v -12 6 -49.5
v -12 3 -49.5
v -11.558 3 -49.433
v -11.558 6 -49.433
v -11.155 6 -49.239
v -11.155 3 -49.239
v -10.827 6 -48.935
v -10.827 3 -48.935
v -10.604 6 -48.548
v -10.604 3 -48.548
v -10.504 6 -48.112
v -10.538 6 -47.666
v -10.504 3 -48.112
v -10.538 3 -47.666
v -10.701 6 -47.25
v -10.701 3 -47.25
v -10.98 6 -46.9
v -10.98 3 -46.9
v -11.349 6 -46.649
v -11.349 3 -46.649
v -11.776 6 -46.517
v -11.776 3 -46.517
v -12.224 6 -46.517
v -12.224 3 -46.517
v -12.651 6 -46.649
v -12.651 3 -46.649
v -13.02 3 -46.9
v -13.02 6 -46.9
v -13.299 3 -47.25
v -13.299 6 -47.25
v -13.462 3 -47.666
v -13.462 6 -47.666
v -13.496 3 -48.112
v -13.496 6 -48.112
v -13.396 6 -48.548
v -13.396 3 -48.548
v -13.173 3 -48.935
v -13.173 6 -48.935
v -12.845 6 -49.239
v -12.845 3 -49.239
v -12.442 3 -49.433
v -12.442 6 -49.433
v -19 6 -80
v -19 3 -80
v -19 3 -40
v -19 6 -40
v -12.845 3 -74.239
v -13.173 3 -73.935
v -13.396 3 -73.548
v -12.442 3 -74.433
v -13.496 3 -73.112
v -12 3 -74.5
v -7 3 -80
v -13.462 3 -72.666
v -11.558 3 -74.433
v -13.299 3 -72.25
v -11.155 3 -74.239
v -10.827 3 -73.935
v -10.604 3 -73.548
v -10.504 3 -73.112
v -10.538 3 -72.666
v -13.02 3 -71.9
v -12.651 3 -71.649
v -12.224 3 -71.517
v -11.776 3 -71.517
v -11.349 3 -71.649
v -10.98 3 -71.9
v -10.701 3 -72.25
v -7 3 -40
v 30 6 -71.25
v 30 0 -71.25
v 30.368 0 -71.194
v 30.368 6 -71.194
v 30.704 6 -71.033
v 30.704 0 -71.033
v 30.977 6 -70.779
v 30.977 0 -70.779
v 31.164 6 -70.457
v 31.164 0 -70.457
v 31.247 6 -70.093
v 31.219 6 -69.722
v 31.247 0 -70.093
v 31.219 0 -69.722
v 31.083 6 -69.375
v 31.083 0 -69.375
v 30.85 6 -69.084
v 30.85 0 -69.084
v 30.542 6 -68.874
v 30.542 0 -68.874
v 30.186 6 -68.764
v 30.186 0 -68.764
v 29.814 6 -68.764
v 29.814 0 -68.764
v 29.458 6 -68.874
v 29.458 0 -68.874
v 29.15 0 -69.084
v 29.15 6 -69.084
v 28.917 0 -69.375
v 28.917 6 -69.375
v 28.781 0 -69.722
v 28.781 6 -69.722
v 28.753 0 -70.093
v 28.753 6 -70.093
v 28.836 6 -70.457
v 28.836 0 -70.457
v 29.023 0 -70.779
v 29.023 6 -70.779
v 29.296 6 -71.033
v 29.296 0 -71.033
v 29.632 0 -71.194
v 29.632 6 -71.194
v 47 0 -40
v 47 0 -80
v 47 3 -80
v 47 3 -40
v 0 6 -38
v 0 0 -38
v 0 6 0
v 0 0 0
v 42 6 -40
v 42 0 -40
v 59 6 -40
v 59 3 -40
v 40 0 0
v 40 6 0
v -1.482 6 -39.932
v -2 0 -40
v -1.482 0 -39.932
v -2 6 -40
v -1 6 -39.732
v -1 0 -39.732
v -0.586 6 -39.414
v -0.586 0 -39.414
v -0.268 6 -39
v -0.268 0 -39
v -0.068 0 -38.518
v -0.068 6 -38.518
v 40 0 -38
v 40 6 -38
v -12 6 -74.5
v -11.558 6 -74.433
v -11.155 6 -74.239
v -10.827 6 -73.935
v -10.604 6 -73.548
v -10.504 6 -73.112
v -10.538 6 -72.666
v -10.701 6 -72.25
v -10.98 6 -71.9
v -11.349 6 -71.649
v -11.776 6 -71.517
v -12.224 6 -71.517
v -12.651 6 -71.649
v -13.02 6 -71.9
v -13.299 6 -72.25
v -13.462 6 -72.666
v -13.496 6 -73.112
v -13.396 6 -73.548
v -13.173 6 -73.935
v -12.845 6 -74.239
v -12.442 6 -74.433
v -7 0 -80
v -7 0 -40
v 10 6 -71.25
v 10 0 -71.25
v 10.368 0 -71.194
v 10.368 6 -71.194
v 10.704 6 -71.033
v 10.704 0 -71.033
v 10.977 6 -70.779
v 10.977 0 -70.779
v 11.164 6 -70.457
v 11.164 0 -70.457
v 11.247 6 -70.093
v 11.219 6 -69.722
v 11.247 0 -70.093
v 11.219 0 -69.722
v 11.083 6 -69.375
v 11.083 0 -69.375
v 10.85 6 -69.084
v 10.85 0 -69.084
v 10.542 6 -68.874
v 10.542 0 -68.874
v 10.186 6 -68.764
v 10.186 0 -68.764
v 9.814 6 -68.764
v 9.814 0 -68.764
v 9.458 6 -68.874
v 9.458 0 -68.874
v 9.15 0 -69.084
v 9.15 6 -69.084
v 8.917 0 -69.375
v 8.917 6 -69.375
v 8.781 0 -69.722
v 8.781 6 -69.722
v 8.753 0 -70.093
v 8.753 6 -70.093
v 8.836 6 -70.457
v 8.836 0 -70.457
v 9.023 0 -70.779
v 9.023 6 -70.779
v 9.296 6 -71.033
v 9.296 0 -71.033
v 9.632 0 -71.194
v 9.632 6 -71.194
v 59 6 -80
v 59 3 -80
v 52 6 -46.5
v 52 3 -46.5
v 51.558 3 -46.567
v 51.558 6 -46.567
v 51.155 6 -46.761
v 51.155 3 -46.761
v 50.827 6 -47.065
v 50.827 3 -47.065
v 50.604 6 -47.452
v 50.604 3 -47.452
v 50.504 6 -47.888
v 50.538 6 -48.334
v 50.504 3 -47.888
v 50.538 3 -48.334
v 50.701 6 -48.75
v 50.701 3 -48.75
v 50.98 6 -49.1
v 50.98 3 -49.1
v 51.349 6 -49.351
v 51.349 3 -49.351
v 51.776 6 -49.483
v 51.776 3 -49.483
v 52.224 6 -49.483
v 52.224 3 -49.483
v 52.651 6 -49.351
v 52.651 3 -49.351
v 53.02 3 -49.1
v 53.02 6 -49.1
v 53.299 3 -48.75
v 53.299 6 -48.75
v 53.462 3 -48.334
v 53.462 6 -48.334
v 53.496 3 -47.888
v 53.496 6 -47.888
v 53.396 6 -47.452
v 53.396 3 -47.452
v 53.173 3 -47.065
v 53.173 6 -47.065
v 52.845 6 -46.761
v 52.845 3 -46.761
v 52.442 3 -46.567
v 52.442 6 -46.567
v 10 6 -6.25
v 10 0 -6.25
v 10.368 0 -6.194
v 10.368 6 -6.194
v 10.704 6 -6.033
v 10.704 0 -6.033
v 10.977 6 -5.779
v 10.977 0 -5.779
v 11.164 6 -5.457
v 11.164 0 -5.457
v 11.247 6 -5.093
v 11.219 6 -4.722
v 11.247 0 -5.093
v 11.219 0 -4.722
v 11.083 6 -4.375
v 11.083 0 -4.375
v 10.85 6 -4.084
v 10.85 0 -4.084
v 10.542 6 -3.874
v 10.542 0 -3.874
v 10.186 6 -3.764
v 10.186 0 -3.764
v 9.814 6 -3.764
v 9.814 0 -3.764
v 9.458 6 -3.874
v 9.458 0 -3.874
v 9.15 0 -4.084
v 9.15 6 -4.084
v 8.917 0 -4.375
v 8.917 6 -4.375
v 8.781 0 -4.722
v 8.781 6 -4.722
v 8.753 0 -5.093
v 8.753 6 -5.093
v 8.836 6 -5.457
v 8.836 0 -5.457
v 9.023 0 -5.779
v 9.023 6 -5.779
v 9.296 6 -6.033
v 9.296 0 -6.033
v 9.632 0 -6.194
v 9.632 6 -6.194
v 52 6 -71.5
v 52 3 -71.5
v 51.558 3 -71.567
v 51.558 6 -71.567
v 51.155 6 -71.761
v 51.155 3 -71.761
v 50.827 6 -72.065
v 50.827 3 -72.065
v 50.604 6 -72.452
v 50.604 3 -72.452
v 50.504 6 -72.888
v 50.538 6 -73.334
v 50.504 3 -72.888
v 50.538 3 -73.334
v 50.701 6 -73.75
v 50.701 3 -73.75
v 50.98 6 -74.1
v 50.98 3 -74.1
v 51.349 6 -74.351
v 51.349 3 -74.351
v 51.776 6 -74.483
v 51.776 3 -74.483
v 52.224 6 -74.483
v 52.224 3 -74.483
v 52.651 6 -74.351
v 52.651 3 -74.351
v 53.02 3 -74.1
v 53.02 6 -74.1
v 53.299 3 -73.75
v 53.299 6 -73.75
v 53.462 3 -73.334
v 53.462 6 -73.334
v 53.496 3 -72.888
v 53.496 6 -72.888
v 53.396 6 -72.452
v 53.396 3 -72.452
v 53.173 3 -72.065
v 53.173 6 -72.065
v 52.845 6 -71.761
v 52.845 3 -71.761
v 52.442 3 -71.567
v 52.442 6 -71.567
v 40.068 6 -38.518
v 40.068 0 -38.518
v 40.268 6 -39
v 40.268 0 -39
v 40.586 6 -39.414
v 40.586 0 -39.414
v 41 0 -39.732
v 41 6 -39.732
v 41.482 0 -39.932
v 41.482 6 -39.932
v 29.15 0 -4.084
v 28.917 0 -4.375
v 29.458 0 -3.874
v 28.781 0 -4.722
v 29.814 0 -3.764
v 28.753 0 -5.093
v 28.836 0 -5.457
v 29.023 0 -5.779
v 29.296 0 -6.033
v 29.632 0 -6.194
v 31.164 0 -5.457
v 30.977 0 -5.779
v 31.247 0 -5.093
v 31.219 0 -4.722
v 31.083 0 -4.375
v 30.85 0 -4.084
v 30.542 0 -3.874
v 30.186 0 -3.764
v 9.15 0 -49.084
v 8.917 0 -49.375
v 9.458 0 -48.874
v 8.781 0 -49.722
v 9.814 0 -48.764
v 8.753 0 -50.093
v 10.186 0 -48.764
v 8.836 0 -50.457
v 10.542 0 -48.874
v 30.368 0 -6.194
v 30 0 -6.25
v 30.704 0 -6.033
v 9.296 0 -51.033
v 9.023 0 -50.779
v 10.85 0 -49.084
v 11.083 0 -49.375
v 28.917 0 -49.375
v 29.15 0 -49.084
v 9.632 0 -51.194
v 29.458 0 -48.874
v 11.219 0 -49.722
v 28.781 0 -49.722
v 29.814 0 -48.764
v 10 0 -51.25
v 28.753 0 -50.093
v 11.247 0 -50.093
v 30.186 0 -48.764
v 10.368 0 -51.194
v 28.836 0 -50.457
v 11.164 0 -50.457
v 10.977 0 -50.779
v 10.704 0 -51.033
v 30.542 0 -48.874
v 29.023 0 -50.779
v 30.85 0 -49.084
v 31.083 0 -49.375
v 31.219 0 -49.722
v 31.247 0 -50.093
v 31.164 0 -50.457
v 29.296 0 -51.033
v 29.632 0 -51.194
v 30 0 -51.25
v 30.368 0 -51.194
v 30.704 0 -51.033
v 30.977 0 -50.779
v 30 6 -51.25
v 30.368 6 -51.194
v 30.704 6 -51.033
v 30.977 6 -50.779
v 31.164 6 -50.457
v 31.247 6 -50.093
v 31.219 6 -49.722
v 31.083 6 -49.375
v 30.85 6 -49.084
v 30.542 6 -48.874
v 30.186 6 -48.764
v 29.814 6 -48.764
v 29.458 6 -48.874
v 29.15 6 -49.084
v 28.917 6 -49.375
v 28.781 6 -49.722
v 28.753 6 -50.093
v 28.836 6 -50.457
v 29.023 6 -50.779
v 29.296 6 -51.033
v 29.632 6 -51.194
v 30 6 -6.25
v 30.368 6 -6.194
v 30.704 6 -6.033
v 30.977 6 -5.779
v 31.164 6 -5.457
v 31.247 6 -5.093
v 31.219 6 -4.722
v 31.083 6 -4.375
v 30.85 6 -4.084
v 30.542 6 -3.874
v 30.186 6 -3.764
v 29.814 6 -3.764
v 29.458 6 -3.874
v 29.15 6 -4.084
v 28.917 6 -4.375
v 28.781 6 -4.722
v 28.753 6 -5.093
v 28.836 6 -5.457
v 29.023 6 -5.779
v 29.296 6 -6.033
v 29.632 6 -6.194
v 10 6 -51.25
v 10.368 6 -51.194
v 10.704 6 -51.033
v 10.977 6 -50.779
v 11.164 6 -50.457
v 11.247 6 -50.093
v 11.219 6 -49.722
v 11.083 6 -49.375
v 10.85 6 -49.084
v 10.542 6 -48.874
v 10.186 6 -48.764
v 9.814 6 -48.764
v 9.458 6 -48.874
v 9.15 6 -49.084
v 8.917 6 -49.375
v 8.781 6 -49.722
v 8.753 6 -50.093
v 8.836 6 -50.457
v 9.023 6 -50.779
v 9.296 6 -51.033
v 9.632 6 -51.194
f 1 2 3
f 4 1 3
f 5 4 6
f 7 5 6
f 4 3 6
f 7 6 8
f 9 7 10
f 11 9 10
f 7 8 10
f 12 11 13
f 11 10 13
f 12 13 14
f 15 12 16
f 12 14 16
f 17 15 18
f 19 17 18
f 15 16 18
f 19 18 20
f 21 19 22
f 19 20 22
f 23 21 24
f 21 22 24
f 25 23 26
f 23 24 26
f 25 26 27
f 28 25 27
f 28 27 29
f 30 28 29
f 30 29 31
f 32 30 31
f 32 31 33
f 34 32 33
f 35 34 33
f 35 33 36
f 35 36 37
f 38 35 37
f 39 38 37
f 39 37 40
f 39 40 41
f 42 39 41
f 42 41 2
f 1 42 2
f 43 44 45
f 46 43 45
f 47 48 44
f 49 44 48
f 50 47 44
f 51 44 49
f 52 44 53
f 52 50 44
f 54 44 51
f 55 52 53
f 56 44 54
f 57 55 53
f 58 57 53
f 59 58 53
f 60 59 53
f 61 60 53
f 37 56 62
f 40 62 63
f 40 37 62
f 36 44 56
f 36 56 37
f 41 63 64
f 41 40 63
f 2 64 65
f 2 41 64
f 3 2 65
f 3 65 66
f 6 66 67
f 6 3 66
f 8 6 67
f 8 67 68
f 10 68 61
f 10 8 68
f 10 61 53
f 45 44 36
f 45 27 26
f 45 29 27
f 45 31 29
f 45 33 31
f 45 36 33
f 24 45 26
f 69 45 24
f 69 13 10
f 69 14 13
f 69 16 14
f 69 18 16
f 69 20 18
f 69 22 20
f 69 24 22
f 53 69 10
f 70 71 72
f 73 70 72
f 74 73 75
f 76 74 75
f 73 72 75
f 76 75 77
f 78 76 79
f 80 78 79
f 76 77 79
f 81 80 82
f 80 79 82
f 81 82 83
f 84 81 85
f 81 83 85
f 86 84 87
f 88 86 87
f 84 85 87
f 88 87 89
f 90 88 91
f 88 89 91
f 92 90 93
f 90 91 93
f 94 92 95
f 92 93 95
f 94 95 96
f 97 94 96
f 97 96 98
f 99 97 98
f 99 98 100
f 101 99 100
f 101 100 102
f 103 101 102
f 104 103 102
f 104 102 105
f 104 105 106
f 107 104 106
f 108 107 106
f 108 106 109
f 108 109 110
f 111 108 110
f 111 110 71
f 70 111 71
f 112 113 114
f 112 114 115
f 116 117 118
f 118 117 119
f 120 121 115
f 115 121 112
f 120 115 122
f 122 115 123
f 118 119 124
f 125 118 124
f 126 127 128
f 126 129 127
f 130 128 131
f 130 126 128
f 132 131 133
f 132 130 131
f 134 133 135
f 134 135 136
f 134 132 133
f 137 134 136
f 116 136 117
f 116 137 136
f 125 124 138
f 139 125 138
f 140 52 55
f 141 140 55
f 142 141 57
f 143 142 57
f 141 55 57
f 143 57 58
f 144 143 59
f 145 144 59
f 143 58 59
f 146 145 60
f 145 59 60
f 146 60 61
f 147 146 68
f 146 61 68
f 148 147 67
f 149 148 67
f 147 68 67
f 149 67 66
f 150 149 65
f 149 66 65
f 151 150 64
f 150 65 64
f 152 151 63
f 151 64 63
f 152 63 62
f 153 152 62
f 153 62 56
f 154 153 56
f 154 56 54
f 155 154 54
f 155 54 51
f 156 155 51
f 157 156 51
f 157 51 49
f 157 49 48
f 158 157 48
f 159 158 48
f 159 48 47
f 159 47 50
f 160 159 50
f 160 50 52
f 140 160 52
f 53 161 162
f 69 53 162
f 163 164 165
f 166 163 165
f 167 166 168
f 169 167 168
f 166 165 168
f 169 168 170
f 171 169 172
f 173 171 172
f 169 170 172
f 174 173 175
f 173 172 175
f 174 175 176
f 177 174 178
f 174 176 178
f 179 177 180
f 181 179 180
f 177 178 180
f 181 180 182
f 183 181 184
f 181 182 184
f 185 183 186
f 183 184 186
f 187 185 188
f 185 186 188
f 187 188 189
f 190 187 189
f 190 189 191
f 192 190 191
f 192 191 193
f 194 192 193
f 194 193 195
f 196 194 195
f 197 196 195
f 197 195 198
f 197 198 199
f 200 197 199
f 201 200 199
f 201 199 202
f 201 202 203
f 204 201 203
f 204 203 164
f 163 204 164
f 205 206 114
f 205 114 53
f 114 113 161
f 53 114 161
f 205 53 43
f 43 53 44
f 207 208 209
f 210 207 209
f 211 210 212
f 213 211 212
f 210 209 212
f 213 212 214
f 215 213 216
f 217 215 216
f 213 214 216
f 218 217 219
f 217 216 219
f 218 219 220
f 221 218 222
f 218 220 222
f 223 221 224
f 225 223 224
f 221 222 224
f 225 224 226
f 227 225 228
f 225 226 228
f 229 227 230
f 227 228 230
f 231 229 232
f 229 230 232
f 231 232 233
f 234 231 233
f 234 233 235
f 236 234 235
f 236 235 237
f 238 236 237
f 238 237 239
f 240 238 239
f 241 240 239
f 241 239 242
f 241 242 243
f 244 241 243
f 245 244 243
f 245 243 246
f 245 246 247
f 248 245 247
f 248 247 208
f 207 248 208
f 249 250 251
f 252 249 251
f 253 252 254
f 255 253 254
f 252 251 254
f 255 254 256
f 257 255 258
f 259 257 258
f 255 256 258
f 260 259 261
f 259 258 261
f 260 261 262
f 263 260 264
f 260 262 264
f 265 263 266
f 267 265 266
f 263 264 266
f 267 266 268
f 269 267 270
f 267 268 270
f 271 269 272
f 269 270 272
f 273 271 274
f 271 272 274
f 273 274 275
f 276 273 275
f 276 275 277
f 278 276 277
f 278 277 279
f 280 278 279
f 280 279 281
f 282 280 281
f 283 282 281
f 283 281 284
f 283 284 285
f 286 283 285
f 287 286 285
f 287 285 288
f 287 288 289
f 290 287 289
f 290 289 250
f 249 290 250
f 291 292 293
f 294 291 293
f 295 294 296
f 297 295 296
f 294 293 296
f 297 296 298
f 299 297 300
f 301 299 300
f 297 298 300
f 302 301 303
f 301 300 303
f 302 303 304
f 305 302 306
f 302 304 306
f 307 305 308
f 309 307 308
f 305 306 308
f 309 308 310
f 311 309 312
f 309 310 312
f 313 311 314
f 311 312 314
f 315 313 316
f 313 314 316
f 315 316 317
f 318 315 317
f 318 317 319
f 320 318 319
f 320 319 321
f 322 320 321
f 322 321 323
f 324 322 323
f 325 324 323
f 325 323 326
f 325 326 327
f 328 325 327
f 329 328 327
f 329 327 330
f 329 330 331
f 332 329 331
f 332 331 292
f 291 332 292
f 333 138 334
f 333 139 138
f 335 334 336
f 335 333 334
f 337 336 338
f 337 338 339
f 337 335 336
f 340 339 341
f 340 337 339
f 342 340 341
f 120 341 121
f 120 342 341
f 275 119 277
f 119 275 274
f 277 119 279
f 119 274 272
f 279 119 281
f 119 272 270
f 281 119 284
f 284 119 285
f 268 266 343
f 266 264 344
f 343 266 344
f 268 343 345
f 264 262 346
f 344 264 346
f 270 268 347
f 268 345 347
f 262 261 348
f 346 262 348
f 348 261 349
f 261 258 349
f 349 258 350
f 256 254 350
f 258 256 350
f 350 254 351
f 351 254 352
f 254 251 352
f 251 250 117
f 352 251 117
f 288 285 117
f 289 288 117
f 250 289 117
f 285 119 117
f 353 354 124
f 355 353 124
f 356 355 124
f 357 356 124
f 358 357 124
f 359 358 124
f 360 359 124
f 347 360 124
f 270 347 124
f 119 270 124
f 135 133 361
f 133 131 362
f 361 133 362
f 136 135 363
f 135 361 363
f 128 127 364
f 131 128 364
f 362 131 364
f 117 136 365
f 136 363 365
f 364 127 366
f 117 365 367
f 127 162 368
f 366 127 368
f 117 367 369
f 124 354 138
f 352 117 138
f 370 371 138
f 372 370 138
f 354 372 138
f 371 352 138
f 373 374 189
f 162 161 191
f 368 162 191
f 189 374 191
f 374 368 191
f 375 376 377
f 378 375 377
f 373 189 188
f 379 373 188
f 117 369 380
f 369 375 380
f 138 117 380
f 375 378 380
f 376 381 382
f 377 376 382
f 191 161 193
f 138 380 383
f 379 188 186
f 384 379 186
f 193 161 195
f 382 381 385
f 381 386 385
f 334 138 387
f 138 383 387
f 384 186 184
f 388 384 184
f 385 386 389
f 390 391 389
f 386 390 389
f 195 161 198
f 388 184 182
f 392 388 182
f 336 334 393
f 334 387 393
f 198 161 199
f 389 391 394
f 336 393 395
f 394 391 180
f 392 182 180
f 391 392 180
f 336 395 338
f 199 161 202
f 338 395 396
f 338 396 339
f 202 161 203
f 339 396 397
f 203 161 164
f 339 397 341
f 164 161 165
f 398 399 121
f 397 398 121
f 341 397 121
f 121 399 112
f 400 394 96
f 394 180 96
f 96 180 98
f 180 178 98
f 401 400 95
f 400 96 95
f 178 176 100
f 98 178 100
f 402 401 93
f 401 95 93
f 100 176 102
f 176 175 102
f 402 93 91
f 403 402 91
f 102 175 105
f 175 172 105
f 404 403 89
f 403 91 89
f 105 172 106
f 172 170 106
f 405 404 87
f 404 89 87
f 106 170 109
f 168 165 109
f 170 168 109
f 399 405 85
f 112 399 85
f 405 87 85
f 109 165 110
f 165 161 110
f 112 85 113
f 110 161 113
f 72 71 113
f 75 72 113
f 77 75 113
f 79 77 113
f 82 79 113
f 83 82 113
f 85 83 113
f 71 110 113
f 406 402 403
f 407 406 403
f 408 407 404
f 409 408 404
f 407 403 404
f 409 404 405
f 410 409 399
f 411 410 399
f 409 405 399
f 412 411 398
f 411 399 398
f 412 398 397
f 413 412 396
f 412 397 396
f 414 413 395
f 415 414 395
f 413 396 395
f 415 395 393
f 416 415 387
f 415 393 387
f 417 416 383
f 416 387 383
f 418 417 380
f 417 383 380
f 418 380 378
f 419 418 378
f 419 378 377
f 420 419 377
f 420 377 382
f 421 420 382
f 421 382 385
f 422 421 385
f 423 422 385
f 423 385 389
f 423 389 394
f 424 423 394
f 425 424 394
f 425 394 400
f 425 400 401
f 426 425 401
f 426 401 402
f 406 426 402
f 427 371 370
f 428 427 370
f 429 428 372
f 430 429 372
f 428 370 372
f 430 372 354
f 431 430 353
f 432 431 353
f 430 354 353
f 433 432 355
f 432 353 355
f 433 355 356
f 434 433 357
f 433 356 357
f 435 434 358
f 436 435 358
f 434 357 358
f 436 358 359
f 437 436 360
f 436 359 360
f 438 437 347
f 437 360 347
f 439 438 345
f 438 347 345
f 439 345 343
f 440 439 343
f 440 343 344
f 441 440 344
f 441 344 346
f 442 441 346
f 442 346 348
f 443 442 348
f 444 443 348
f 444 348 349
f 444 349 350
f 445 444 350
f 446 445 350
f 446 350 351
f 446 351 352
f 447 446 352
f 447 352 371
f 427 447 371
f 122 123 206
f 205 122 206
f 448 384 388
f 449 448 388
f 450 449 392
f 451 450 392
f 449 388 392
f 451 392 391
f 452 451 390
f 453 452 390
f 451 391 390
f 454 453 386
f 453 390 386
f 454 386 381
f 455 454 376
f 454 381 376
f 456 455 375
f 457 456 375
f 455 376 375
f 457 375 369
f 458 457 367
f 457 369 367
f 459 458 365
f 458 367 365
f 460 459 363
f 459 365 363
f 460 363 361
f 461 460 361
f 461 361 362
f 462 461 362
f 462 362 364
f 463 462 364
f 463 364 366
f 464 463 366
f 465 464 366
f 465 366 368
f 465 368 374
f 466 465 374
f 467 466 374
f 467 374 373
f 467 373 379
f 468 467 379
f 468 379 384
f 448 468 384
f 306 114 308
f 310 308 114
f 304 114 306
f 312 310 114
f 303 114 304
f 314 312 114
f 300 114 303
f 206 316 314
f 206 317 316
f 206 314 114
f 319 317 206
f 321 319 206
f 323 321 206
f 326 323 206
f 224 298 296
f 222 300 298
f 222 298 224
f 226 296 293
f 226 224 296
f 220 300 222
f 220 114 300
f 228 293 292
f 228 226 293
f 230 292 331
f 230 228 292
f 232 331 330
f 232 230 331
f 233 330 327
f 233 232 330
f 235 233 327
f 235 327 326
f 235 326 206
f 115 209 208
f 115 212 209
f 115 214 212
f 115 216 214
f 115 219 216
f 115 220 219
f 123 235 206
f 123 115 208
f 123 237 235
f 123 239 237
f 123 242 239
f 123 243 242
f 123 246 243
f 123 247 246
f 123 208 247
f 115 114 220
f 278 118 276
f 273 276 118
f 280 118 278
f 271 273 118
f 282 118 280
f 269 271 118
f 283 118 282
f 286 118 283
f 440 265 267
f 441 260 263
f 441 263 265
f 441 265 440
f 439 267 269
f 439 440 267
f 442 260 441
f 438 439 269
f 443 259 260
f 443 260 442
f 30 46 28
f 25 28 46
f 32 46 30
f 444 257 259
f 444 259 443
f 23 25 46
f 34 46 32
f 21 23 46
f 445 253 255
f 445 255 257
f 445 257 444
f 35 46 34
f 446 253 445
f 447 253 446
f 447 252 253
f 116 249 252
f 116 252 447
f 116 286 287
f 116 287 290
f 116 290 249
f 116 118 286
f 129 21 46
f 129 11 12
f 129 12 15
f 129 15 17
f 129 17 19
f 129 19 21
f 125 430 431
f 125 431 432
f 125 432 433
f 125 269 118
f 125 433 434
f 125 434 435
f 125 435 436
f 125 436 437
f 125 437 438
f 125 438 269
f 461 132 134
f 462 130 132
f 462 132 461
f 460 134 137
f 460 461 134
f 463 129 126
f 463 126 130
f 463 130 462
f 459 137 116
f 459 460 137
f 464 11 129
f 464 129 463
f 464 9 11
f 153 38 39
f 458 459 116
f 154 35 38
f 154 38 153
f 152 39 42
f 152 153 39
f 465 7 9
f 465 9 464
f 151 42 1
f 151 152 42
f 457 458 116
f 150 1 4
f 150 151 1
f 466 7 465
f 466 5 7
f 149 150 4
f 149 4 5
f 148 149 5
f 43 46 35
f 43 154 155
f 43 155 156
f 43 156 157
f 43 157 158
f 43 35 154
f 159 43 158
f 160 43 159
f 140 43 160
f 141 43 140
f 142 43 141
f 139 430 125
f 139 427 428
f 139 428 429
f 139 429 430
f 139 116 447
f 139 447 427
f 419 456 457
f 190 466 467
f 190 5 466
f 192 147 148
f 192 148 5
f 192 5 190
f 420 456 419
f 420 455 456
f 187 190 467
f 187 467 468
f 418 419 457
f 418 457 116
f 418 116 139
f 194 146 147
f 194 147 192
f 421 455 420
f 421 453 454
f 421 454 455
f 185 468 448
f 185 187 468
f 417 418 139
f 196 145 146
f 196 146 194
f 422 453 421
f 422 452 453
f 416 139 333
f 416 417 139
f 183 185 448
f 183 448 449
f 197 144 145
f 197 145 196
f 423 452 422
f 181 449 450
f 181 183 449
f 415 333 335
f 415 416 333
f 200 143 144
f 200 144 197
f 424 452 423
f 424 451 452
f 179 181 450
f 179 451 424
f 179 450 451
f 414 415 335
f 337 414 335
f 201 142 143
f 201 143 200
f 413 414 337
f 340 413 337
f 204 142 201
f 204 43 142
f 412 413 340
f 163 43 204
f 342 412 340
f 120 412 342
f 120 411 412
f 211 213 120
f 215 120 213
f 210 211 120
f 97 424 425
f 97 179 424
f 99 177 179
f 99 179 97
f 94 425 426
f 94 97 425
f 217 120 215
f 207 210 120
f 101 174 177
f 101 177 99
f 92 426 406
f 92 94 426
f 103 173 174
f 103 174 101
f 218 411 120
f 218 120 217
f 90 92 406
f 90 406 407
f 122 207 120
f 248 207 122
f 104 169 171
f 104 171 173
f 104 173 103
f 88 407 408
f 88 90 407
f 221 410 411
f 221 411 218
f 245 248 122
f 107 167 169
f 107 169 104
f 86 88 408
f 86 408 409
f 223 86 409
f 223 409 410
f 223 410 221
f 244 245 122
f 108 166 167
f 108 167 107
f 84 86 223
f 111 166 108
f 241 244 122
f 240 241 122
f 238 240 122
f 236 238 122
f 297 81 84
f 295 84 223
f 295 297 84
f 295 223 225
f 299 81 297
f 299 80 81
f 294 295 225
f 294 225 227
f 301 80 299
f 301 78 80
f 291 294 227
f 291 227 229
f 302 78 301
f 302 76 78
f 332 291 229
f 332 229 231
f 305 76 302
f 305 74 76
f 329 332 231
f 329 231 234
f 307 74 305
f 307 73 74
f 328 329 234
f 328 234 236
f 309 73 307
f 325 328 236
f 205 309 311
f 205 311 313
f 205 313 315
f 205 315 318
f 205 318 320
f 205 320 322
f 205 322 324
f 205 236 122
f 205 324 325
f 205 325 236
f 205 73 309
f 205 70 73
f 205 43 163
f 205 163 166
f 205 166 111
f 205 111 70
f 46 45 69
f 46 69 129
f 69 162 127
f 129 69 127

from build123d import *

# Parameters (mm, degrees)
EXTRUDE_1_DEPTH     = 6
FILLET_1_R          = 2
SKETCH_18_W         = 12
SKETCH_18_H         = 40
CUT_EXTRUDE_7_DEPTH = 3
SKETCH_19_R         = 1.5
CUT_EXTRUDE_8_DEPTH = 10
SKETCH_20_R         = 1.25
CUT_EXTRUDE_9_DEPTH = 10


with BuildPart() as part:
    # 草图1 → 凸台-拉伸1 (new body)
    with BuildSketch(Plane(origin=(0, 0, 0), x_dir=(1, 0, 0), z_dir=(0, 1, 0))):
        Polygon((0, 0), (40, 0), (40, 40), (59, 40), (59, 80), (-19, 80), (-19, 40), (0, 40), align=None)
    extrude(amount=EXTRUDE_1_DEPTH)

    # 圆角1
    fillet_1_edges = [part.edges().sort_by_distance(p)[0] for p in [
        (0, 3, -40),
        (40, 3, -40),
    ]]
    fillet(fillet_1_edges, radius=FILLET_1_R)

    # 草图18 → 切除-拉伸7 (cut)
    with BuildSketch(Plane.XZ):
        with Locations((-13, -60)):
            Rectangle(SKETCH_18_W, SKETCH_18_H)
        with Locations((53, -60)):
            Rectangle(SKETCH_18_W, SKETCH_18_H)
    extrude(amount=-CUT_EXTRUDE_7_DEPTH, mode=Mode.SUBTRACT)

    # 草图19 → 切除-拉伸8 (cut)
    with BuildSketch(Plane.XZ.offset(-3)):
        with Locations(Location((-12, -48, 0), (0, 0, 270))):
            Circle(SKETCH_19_R)
        with Locations(Location((-12, -73, 0), (0, 0, 270))):
            Circle(SKETCH_19_R)
        with Locations(Location((52, -73, 0), (0, 0, 90))):
            Circle(SKETCH_19_R)
        with Locations(Location((52, -48, 0), (0, 0, 90))):
            Circle(SKETCH_19_R)
    extrude(amount=-CUT_EXTRUDE_8_DEPTH, mode=Mode.SUBTRACT)

    # 草图20 → 切除-拉伸9 (cut)
    with BuildSketch(Plane.XZ):
        with Locations(Location((10, -5, 0), (0, 0, 270))):
            Circle(SKETCH_20_R)
        with Locations(Location((30, -5, 0), (0, 0, 270))):
            Circle(SKETCH_20_R)
        with Locations(Location((10, -50, 0), (0, 0, 270))):
            Circle(SKETCH_20_R)
        with Locations(Location((10, -70, 0), (0, 0, 270))):
            Circle(SKETCH_20_R)
        with Locations(Location((30, -50, 0), (0, 0, 270))):
            Circle(SKETCH_20_R)
        with Locations(Location((30, -70, 0), (0, 0, 270))):
            Circle(SKETCH_20_R)
    extrude(amount=-CUT_EXTRUDE_9_DEPTH, mode=Mode.SUBTRACT)


solid = part.part
